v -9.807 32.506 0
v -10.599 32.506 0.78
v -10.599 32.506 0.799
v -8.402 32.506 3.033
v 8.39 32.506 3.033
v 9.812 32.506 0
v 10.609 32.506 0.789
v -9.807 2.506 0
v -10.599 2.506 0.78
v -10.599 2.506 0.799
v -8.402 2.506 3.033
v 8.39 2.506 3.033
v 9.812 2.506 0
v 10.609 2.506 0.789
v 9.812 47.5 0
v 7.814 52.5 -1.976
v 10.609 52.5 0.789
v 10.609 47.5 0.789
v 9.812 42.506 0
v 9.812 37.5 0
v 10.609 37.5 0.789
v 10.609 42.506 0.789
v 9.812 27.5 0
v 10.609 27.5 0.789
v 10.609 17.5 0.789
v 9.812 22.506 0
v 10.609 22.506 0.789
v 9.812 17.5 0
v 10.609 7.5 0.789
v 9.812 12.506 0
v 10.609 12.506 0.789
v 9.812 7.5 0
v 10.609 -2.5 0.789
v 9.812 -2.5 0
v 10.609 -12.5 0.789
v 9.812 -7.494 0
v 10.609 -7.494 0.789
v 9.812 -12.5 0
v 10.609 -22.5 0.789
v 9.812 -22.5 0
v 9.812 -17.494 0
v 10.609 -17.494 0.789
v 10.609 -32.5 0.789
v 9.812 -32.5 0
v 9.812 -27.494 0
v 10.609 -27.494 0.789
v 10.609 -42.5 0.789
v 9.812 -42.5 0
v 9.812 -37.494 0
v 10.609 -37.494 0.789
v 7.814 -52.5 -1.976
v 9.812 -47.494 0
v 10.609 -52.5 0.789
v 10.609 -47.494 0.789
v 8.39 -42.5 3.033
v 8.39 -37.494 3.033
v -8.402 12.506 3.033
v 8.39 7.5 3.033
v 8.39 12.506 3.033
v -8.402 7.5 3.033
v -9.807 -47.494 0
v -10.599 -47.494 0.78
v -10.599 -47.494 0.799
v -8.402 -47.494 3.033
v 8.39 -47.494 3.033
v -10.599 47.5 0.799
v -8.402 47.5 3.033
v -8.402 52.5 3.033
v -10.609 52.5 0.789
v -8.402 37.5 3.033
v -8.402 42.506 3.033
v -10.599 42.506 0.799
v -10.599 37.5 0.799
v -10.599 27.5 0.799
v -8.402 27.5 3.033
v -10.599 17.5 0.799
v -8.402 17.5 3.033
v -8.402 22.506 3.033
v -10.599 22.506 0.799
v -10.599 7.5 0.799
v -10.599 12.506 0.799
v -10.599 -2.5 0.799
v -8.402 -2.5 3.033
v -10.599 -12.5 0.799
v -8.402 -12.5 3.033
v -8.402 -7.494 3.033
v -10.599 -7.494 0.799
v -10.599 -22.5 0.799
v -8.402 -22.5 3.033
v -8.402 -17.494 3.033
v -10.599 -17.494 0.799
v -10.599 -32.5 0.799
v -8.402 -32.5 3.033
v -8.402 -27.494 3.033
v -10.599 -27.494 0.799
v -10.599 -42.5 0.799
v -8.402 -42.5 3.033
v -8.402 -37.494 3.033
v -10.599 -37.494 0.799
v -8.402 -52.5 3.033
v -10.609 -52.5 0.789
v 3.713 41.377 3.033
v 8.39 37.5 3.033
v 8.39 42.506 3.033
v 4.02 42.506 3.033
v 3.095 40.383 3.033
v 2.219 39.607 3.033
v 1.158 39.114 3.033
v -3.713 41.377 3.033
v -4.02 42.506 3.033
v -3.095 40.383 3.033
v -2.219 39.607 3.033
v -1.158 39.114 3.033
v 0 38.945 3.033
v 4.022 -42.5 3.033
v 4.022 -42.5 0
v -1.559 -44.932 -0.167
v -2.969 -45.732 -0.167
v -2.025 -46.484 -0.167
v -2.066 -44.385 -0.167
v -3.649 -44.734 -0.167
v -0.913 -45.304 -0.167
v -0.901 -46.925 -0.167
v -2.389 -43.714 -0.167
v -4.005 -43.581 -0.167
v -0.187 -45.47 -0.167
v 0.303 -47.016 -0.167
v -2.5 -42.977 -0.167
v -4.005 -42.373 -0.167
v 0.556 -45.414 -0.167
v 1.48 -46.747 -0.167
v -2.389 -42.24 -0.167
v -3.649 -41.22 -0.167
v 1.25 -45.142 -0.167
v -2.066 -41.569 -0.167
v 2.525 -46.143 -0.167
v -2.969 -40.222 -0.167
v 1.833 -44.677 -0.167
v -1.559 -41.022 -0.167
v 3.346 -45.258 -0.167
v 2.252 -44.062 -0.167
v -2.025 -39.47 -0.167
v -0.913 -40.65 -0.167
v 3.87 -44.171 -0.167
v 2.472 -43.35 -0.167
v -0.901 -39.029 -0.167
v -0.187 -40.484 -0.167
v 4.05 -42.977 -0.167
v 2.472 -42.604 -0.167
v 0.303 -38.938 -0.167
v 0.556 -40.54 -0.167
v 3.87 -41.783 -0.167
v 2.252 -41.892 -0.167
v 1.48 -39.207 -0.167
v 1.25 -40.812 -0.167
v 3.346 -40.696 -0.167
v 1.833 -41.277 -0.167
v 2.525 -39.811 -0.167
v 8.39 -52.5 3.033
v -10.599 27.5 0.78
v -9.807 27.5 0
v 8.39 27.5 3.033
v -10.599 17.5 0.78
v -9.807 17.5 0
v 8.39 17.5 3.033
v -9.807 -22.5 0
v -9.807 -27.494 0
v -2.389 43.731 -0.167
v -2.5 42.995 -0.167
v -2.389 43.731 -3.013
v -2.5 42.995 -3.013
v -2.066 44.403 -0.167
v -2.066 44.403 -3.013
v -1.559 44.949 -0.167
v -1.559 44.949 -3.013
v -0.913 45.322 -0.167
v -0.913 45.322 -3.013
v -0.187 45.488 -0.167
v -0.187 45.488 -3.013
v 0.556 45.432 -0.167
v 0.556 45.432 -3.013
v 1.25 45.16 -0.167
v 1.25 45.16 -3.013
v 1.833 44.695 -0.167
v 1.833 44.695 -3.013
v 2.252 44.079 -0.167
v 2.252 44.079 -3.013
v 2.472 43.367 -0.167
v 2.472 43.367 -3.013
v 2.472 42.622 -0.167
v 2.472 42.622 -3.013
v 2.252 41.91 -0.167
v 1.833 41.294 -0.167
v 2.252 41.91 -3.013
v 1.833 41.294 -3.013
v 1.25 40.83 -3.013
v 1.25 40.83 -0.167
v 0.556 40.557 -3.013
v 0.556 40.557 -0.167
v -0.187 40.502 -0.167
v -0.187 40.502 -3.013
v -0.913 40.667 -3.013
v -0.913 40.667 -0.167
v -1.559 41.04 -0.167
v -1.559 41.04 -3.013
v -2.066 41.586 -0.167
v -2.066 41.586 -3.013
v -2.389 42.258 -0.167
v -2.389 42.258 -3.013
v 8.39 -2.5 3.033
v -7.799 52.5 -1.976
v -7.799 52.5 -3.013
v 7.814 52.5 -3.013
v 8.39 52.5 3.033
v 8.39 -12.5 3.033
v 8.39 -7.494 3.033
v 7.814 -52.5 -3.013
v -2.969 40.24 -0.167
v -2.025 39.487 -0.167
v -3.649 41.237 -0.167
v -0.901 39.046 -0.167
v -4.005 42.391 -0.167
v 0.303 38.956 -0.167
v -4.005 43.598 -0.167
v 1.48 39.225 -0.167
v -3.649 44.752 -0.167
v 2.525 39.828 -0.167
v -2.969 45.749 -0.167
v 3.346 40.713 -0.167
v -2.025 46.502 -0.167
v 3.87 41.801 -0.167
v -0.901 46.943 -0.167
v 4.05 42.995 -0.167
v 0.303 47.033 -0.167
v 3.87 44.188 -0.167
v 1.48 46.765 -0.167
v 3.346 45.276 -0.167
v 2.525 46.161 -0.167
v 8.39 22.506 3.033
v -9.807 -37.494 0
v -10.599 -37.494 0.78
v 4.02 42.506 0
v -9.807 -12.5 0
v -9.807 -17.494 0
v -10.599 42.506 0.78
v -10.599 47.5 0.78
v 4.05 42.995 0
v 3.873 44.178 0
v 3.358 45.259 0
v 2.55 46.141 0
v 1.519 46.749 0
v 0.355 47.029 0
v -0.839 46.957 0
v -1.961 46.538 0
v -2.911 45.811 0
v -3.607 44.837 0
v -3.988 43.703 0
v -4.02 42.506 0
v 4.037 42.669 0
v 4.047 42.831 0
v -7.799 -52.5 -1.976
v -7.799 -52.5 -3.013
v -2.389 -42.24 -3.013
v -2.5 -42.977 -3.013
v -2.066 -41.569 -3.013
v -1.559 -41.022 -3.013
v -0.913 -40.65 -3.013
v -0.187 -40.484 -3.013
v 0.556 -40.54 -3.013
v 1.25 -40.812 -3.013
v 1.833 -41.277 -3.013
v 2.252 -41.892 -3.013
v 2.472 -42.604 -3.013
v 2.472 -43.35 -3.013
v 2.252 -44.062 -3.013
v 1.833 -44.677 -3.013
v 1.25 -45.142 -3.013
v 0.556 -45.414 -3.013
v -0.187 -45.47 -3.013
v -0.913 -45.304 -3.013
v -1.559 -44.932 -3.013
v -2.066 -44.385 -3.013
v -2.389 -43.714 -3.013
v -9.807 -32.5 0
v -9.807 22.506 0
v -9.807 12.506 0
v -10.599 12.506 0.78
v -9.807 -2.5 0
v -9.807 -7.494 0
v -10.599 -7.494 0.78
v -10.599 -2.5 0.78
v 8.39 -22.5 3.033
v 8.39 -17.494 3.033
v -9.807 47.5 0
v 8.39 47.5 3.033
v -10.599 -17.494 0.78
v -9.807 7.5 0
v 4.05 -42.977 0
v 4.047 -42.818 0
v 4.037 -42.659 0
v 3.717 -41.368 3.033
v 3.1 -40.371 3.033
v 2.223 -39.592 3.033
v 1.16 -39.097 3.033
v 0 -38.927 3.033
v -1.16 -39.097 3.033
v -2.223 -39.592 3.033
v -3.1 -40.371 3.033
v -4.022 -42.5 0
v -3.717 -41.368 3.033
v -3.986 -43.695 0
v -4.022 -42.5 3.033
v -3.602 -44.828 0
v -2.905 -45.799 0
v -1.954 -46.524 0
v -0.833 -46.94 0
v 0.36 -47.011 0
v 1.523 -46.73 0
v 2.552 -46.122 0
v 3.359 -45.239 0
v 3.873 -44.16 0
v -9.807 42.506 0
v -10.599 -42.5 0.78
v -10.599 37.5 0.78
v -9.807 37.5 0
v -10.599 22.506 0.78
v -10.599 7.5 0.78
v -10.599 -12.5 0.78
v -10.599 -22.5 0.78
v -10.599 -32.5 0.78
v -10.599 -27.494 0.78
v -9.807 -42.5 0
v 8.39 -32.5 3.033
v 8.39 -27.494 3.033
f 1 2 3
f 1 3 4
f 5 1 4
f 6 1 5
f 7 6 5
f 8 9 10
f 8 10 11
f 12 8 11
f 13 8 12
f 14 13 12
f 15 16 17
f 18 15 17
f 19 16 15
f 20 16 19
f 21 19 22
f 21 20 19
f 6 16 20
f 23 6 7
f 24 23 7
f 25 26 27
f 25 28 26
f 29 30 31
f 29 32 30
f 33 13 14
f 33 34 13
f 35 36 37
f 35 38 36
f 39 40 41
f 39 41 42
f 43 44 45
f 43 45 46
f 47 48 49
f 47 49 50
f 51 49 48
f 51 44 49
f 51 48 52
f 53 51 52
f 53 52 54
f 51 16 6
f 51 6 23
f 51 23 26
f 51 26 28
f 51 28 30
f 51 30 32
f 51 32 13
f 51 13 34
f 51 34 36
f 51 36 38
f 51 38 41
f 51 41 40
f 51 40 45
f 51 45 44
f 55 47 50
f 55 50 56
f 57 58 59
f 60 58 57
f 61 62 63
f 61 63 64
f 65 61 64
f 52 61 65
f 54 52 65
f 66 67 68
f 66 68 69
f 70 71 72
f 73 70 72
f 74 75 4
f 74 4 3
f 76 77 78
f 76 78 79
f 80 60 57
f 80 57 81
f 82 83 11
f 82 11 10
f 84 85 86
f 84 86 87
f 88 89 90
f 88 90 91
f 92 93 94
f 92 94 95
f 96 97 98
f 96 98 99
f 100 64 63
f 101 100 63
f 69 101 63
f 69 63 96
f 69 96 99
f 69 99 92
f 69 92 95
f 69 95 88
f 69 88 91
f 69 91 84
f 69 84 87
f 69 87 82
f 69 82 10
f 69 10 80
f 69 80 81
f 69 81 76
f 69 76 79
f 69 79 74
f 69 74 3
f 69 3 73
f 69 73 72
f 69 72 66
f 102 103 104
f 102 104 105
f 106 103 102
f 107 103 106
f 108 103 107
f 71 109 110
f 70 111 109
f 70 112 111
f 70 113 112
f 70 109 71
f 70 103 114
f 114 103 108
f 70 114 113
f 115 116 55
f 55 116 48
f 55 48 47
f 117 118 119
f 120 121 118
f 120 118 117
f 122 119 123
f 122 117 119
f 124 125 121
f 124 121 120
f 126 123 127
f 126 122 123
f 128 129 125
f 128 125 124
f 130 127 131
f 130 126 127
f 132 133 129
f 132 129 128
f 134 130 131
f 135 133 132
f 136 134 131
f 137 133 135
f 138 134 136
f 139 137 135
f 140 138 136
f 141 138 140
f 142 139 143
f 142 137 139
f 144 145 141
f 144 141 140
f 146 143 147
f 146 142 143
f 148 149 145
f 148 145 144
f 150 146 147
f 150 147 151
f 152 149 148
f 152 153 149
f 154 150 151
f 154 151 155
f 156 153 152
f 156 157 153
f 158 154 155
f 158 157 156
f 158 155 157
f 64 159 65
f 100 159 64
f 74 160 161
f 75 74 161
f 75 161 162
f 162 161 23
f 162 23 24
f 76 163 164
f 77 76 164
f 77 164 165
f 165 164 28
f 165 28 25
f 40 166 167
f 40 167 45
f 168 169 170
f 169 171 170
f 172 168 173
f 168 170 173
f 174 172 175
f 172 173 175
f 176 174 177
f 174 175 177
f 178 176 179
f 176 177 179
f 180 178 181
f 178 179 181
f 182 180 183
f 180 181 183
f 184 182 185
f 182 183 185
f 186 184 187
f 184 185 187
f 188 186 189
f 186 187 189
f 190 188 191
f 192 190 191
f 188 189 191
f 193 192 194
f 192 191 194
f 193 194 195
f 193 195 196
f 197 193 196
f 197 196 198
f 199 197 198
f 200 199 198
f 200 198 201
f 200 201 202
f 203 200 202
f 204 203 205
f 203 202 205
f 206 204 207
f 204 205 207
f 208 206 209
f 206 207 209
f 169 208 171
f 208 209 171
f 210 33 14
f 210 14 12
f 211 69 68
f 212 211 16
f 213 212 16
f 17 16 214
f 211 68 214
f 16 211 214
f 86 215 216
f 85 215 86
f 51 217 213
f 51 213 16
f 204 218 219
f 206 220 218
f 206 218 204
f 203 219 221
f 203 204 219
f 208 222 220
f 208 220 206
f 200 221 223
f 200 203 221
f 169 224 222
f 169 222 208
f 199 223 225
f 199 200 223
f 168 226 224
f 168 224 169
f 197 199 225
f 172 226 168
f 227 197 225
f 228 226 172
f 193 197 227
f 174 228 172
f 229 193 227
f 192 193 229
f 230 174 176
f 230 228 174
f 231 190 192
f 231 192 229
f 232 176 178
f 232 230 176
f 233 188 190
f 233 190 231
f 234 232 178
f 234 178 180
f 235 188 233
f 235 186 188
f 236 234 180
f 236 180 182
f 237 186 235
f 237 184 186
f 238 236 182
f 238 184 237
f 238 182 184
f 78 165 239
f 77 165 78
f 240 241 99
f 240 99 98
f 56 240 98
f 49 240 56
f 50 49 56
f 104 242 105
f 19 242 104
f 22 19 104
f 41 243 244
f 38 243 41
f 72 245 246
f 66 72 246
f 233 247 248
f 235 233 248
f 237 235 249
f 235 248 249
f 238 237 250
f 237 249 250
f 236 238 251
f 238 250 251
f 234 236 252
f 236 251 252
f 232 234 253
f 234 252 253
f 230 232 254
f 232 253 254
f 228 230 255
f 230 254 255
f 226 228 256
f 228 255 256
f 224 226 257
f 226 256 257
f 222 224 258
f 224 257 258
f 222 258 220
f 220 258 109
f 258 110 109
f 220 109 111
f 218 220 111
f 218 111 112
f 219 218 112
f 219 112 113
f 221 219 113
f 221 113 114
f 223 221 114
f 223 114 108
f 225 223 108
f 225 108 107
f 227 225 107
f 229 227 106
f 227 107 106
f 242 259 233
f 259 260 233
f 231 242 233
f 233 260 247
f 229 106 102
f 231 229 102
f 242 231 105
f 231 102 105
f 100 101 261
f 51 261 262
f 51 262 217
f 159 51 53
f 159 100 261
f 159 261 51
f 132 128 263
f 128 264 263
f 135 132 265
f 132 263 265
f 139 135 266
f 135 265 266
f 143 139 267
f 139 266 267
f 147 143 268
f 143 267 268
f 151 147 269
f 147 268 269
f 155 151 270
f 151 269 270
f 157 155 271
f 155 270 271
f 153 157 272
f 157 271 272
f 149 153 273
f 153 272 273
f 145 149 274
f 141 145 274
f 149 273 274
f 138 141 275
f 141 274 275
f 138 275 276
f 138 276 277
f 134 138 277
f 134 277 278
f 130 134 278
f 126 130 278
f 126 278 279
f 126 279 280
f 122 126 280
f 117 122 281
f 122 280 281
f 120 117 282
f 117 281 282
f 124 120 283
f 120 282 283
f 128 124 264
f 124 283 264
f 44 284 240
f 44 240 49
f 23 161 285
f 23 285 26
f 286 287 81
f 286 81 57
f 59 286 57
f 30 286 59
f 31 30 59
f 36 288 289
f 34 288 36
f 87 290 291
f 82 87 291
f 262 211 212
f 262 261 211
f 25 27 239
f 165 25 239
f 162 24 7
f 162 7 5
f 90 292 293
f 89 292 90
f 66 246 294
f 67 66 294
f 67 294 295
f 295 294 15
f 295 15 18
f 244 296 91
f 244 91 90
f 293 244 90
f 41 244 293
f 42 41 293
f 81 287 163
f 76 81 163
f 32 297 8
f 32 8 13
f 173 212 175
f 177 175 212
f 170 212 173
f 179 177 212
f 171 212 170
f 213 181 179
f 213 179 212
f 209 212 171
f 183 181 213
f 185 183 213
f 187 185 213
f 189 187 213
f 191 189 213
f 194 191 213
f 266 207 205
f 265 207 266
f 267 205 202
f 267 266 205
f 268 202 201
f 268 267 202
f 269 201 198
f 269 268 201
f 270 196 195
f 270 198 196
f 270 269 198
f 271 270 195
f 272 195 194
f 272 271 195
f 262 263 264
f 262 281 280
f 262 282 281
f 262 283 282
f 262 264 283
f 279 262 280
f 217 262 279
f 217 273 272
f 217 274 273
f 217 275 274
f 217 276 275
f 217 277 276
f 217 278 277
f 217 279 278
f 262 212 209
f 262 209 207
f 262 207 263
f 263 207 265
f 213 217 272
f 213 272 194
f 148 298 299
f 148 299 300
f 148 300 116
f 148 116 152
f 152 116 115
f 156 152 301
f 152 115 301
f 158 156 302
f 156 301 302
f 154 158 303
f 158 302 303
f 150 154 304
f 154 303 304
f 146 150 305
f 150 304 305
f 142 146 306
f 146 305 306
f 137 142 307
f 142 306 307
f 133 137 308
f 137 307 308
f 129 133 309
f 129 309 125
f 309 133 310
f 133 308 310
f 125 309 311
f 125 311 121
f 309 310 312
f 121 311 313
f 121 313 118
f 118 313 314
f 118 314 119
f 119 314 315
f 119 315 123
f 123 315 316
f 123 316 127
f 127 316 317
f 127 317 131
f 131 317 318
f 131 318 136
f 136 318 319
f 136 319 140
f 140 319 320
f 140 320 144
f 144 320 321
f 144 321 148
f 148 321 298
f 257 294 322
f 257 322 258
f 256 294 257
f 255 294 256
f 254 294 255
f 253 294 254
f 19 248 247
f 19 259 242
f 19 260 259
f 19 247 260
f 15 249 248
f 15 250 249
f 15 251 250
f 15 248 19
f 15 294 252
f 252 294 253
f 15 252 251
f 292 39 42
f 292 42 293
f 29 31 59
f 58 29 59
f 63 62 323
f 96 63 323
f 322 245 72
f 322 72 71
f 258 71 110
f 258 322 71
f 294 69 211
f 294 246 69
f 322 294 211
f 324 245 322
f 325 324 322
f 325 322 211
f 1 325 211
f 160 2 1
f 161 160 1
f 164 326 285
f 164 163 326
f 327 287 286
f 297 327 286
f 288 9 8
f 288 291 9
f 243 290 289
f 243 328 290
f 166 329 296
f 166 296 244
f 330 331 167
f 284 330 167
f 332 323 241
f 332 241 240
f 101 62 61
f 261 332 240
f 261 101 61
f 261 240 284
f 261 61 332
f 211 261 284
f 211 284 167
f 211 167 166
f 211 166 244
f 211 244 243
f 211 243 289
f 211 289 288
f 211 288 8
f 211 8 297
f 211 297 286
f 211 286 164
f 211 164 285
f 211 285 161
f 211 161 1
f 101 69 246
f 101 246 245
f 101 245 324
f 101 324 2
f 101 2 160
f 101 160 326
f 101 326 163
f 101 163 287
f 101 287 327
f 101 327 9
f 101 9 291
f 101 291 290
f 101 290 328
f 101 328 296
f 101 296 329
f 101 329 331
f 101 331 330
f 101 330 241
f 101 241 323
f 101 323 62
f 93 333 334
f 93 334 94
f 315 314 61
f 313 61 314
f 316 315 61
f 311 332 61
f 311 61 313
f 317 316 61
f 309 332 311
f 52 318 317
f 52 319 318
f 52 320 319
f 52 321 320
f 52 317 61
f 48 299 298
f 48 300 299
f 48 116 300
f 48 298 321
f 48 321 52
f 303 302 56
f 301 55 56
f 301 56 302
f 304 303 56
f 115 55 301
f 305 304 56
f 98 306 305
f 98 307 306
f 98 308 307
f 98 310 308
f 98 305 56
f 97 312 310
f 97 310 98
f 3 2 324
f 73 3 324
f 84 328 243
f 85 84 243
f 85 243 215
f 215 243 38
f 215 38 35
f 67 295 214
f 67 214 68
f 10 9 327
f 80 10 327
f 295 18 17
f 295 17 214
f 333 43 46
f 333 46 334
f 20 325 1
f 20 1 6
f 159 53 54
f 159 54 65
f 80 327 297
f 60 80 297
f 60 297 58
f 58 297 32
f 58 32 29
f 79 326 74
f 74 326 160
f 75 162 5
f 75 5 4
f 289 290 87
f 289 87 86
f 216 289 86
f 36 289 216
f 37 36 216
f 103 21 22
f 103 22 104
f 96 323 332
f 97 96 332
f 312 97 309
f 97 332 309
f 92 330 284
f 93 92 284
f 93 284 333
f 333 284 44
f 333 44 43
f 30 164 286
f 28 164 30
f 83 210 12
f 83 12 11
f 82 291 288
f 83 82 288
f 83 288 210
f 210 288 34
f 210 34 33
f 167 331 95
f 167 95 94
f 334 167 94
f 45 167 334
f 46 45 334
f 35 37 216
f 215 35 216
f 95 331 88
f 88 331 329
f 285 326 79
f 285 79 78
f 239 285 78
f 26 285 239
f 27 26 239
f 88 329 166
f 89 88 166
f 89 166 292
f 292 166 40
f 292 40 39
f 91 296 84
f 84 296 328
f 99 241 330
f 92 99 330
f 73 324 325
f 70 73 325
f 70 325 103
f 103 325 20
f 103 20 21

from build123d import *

# Parameters (mm, degrees)
F1_DEPTH       = 52.5
F2_W           = 21.210102
F2_H           = 4.993801
F3_DEPTH       = 5
F5_D           = 5
F5_DEPTH       = 6.1
F5_CBORE_D     = 8.1
F5_CBORE_DEPTH = 3.2
F6_D           = 5
F6_DEPTH       = 6.1
F6_CBORE_D     = 8.1
F6_CBORE_DEPTH = 3.2


with BuildPart() as f1:
    # F0 (on Front) → F1 (new body, symmetric)
    with BuildSketch(Plane.XZ):
        Polygon((-7.799124, -1.9758), (-7.799124, -3.012683), (7.814229, -3.012683), (7.814229, -1.9758), (10.609305, 0.789221), (8.38992, 3.032728), (-8.401712, 3.032728), (-10.609227, 0.789221), align=None)
    extrude(amount=F1_DEPTH, both=True)

    # F2 (on Top) → F3 (cut)
    with BuildSketch(Plane.XY):
        with Locations((0.005642, -4.996805)):
            Rectangle(F2_W, F2_H)
        with Locations((0.005642, -14.996806)):
            Rectangle(F2_W, F2_H)
        with Locations((0.005642, -24.996806)):
            Rectangle(F2_W, F2_H)
        with Locations((0.005642, -34.996805)):
            Rectangle(F2_W, F2_H)
        with Locations((0.005642, -44.996805)):
            Rectangle(F2_W, F2_H)
        with Locations((0.005642, 5.003195)):
            Rectangle(F2_W, F2_H)
        with Locations((0.005642, 15.003194)):
            Rectangle(F2_W, F2_H)
        with Locations((0.005642, 25.003194)):
            Rectangle(F2_W, F2_H)
        with Locations((0.005642, 35.003194)):
            Rectangle(F2_W, F2_H)
        with Locations((0.005642, 45.003194)):
            Rectangle(F2_W, F2_H)
    extrude(amount=F3_DEPTH, mode=Mode.SUBTRACT)

    # F5
    with Locations(Plane.XY.offset(3.032728)):
        with Locations((0, 42.994596)):
            CounterBoreHole(F5_D / 2, F5_CBORE_D / 2, F5_CBORE_DEPTH, depth=F5_DEPTH)

    # F6
    with Locations(Plane.XY.offset(3.032728)):
        with Locations((0, -42.977002)):
            CounterBoreHole(F6_D / 2, F6_CBORE_D / 2, F6_CBORE_DEPTH, depth=F6_DEPTH)


solid = f1.part
